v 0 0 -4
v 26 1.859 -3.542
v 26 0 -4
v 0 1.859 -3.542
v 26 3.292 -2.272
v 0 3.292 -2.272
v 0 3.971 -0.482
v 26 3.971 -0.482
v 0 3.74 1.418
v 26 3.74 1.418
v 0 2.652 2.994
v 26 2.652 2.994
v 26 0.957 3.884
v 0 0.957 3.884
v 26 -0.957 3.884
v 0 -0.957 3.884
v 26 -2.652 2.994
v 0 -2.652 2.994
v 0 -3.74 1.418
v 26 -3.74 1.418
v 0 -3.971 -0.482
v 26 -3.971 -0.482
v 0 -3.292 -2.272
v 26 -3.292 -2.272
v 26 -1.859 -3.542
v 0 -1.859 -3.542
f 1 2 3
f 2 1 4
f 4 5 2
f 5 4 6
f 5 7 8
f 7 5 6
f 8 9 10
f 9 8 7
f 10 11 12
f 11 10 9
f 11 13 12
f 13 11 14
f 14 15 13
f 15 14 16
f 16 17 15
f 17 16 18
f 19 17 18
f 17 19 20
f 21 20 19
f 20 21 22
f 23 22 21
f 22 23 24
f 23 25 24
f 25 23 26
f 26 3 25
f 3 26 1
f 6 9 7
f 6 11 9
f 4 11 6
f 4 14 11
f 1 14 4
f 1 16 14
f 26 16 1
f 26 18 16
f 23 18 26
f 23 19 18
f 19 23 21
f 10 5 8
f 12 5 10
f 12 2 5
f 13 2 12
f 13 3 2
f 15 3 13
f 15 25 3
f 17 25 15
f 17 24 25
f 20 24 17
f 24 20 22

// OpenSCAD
// file: front_cylinder_upright/front_cylinder_upright.scad
module front_cylinder_upright() {
    cylinder(h=26.0, r=4);
}

// call module when run directly
front_cylinder_upright();
// main file
// use modules
use <front_cylinder_upright/front_cylinder_upright.scad>

module front_cylinder_left_no_offset() {
    rotate(a=90, v=[0, 1, 0]) {
        front_cylinder_upright();
    }
}

// call module when run directly
front_cylinder_left_no_offset();
